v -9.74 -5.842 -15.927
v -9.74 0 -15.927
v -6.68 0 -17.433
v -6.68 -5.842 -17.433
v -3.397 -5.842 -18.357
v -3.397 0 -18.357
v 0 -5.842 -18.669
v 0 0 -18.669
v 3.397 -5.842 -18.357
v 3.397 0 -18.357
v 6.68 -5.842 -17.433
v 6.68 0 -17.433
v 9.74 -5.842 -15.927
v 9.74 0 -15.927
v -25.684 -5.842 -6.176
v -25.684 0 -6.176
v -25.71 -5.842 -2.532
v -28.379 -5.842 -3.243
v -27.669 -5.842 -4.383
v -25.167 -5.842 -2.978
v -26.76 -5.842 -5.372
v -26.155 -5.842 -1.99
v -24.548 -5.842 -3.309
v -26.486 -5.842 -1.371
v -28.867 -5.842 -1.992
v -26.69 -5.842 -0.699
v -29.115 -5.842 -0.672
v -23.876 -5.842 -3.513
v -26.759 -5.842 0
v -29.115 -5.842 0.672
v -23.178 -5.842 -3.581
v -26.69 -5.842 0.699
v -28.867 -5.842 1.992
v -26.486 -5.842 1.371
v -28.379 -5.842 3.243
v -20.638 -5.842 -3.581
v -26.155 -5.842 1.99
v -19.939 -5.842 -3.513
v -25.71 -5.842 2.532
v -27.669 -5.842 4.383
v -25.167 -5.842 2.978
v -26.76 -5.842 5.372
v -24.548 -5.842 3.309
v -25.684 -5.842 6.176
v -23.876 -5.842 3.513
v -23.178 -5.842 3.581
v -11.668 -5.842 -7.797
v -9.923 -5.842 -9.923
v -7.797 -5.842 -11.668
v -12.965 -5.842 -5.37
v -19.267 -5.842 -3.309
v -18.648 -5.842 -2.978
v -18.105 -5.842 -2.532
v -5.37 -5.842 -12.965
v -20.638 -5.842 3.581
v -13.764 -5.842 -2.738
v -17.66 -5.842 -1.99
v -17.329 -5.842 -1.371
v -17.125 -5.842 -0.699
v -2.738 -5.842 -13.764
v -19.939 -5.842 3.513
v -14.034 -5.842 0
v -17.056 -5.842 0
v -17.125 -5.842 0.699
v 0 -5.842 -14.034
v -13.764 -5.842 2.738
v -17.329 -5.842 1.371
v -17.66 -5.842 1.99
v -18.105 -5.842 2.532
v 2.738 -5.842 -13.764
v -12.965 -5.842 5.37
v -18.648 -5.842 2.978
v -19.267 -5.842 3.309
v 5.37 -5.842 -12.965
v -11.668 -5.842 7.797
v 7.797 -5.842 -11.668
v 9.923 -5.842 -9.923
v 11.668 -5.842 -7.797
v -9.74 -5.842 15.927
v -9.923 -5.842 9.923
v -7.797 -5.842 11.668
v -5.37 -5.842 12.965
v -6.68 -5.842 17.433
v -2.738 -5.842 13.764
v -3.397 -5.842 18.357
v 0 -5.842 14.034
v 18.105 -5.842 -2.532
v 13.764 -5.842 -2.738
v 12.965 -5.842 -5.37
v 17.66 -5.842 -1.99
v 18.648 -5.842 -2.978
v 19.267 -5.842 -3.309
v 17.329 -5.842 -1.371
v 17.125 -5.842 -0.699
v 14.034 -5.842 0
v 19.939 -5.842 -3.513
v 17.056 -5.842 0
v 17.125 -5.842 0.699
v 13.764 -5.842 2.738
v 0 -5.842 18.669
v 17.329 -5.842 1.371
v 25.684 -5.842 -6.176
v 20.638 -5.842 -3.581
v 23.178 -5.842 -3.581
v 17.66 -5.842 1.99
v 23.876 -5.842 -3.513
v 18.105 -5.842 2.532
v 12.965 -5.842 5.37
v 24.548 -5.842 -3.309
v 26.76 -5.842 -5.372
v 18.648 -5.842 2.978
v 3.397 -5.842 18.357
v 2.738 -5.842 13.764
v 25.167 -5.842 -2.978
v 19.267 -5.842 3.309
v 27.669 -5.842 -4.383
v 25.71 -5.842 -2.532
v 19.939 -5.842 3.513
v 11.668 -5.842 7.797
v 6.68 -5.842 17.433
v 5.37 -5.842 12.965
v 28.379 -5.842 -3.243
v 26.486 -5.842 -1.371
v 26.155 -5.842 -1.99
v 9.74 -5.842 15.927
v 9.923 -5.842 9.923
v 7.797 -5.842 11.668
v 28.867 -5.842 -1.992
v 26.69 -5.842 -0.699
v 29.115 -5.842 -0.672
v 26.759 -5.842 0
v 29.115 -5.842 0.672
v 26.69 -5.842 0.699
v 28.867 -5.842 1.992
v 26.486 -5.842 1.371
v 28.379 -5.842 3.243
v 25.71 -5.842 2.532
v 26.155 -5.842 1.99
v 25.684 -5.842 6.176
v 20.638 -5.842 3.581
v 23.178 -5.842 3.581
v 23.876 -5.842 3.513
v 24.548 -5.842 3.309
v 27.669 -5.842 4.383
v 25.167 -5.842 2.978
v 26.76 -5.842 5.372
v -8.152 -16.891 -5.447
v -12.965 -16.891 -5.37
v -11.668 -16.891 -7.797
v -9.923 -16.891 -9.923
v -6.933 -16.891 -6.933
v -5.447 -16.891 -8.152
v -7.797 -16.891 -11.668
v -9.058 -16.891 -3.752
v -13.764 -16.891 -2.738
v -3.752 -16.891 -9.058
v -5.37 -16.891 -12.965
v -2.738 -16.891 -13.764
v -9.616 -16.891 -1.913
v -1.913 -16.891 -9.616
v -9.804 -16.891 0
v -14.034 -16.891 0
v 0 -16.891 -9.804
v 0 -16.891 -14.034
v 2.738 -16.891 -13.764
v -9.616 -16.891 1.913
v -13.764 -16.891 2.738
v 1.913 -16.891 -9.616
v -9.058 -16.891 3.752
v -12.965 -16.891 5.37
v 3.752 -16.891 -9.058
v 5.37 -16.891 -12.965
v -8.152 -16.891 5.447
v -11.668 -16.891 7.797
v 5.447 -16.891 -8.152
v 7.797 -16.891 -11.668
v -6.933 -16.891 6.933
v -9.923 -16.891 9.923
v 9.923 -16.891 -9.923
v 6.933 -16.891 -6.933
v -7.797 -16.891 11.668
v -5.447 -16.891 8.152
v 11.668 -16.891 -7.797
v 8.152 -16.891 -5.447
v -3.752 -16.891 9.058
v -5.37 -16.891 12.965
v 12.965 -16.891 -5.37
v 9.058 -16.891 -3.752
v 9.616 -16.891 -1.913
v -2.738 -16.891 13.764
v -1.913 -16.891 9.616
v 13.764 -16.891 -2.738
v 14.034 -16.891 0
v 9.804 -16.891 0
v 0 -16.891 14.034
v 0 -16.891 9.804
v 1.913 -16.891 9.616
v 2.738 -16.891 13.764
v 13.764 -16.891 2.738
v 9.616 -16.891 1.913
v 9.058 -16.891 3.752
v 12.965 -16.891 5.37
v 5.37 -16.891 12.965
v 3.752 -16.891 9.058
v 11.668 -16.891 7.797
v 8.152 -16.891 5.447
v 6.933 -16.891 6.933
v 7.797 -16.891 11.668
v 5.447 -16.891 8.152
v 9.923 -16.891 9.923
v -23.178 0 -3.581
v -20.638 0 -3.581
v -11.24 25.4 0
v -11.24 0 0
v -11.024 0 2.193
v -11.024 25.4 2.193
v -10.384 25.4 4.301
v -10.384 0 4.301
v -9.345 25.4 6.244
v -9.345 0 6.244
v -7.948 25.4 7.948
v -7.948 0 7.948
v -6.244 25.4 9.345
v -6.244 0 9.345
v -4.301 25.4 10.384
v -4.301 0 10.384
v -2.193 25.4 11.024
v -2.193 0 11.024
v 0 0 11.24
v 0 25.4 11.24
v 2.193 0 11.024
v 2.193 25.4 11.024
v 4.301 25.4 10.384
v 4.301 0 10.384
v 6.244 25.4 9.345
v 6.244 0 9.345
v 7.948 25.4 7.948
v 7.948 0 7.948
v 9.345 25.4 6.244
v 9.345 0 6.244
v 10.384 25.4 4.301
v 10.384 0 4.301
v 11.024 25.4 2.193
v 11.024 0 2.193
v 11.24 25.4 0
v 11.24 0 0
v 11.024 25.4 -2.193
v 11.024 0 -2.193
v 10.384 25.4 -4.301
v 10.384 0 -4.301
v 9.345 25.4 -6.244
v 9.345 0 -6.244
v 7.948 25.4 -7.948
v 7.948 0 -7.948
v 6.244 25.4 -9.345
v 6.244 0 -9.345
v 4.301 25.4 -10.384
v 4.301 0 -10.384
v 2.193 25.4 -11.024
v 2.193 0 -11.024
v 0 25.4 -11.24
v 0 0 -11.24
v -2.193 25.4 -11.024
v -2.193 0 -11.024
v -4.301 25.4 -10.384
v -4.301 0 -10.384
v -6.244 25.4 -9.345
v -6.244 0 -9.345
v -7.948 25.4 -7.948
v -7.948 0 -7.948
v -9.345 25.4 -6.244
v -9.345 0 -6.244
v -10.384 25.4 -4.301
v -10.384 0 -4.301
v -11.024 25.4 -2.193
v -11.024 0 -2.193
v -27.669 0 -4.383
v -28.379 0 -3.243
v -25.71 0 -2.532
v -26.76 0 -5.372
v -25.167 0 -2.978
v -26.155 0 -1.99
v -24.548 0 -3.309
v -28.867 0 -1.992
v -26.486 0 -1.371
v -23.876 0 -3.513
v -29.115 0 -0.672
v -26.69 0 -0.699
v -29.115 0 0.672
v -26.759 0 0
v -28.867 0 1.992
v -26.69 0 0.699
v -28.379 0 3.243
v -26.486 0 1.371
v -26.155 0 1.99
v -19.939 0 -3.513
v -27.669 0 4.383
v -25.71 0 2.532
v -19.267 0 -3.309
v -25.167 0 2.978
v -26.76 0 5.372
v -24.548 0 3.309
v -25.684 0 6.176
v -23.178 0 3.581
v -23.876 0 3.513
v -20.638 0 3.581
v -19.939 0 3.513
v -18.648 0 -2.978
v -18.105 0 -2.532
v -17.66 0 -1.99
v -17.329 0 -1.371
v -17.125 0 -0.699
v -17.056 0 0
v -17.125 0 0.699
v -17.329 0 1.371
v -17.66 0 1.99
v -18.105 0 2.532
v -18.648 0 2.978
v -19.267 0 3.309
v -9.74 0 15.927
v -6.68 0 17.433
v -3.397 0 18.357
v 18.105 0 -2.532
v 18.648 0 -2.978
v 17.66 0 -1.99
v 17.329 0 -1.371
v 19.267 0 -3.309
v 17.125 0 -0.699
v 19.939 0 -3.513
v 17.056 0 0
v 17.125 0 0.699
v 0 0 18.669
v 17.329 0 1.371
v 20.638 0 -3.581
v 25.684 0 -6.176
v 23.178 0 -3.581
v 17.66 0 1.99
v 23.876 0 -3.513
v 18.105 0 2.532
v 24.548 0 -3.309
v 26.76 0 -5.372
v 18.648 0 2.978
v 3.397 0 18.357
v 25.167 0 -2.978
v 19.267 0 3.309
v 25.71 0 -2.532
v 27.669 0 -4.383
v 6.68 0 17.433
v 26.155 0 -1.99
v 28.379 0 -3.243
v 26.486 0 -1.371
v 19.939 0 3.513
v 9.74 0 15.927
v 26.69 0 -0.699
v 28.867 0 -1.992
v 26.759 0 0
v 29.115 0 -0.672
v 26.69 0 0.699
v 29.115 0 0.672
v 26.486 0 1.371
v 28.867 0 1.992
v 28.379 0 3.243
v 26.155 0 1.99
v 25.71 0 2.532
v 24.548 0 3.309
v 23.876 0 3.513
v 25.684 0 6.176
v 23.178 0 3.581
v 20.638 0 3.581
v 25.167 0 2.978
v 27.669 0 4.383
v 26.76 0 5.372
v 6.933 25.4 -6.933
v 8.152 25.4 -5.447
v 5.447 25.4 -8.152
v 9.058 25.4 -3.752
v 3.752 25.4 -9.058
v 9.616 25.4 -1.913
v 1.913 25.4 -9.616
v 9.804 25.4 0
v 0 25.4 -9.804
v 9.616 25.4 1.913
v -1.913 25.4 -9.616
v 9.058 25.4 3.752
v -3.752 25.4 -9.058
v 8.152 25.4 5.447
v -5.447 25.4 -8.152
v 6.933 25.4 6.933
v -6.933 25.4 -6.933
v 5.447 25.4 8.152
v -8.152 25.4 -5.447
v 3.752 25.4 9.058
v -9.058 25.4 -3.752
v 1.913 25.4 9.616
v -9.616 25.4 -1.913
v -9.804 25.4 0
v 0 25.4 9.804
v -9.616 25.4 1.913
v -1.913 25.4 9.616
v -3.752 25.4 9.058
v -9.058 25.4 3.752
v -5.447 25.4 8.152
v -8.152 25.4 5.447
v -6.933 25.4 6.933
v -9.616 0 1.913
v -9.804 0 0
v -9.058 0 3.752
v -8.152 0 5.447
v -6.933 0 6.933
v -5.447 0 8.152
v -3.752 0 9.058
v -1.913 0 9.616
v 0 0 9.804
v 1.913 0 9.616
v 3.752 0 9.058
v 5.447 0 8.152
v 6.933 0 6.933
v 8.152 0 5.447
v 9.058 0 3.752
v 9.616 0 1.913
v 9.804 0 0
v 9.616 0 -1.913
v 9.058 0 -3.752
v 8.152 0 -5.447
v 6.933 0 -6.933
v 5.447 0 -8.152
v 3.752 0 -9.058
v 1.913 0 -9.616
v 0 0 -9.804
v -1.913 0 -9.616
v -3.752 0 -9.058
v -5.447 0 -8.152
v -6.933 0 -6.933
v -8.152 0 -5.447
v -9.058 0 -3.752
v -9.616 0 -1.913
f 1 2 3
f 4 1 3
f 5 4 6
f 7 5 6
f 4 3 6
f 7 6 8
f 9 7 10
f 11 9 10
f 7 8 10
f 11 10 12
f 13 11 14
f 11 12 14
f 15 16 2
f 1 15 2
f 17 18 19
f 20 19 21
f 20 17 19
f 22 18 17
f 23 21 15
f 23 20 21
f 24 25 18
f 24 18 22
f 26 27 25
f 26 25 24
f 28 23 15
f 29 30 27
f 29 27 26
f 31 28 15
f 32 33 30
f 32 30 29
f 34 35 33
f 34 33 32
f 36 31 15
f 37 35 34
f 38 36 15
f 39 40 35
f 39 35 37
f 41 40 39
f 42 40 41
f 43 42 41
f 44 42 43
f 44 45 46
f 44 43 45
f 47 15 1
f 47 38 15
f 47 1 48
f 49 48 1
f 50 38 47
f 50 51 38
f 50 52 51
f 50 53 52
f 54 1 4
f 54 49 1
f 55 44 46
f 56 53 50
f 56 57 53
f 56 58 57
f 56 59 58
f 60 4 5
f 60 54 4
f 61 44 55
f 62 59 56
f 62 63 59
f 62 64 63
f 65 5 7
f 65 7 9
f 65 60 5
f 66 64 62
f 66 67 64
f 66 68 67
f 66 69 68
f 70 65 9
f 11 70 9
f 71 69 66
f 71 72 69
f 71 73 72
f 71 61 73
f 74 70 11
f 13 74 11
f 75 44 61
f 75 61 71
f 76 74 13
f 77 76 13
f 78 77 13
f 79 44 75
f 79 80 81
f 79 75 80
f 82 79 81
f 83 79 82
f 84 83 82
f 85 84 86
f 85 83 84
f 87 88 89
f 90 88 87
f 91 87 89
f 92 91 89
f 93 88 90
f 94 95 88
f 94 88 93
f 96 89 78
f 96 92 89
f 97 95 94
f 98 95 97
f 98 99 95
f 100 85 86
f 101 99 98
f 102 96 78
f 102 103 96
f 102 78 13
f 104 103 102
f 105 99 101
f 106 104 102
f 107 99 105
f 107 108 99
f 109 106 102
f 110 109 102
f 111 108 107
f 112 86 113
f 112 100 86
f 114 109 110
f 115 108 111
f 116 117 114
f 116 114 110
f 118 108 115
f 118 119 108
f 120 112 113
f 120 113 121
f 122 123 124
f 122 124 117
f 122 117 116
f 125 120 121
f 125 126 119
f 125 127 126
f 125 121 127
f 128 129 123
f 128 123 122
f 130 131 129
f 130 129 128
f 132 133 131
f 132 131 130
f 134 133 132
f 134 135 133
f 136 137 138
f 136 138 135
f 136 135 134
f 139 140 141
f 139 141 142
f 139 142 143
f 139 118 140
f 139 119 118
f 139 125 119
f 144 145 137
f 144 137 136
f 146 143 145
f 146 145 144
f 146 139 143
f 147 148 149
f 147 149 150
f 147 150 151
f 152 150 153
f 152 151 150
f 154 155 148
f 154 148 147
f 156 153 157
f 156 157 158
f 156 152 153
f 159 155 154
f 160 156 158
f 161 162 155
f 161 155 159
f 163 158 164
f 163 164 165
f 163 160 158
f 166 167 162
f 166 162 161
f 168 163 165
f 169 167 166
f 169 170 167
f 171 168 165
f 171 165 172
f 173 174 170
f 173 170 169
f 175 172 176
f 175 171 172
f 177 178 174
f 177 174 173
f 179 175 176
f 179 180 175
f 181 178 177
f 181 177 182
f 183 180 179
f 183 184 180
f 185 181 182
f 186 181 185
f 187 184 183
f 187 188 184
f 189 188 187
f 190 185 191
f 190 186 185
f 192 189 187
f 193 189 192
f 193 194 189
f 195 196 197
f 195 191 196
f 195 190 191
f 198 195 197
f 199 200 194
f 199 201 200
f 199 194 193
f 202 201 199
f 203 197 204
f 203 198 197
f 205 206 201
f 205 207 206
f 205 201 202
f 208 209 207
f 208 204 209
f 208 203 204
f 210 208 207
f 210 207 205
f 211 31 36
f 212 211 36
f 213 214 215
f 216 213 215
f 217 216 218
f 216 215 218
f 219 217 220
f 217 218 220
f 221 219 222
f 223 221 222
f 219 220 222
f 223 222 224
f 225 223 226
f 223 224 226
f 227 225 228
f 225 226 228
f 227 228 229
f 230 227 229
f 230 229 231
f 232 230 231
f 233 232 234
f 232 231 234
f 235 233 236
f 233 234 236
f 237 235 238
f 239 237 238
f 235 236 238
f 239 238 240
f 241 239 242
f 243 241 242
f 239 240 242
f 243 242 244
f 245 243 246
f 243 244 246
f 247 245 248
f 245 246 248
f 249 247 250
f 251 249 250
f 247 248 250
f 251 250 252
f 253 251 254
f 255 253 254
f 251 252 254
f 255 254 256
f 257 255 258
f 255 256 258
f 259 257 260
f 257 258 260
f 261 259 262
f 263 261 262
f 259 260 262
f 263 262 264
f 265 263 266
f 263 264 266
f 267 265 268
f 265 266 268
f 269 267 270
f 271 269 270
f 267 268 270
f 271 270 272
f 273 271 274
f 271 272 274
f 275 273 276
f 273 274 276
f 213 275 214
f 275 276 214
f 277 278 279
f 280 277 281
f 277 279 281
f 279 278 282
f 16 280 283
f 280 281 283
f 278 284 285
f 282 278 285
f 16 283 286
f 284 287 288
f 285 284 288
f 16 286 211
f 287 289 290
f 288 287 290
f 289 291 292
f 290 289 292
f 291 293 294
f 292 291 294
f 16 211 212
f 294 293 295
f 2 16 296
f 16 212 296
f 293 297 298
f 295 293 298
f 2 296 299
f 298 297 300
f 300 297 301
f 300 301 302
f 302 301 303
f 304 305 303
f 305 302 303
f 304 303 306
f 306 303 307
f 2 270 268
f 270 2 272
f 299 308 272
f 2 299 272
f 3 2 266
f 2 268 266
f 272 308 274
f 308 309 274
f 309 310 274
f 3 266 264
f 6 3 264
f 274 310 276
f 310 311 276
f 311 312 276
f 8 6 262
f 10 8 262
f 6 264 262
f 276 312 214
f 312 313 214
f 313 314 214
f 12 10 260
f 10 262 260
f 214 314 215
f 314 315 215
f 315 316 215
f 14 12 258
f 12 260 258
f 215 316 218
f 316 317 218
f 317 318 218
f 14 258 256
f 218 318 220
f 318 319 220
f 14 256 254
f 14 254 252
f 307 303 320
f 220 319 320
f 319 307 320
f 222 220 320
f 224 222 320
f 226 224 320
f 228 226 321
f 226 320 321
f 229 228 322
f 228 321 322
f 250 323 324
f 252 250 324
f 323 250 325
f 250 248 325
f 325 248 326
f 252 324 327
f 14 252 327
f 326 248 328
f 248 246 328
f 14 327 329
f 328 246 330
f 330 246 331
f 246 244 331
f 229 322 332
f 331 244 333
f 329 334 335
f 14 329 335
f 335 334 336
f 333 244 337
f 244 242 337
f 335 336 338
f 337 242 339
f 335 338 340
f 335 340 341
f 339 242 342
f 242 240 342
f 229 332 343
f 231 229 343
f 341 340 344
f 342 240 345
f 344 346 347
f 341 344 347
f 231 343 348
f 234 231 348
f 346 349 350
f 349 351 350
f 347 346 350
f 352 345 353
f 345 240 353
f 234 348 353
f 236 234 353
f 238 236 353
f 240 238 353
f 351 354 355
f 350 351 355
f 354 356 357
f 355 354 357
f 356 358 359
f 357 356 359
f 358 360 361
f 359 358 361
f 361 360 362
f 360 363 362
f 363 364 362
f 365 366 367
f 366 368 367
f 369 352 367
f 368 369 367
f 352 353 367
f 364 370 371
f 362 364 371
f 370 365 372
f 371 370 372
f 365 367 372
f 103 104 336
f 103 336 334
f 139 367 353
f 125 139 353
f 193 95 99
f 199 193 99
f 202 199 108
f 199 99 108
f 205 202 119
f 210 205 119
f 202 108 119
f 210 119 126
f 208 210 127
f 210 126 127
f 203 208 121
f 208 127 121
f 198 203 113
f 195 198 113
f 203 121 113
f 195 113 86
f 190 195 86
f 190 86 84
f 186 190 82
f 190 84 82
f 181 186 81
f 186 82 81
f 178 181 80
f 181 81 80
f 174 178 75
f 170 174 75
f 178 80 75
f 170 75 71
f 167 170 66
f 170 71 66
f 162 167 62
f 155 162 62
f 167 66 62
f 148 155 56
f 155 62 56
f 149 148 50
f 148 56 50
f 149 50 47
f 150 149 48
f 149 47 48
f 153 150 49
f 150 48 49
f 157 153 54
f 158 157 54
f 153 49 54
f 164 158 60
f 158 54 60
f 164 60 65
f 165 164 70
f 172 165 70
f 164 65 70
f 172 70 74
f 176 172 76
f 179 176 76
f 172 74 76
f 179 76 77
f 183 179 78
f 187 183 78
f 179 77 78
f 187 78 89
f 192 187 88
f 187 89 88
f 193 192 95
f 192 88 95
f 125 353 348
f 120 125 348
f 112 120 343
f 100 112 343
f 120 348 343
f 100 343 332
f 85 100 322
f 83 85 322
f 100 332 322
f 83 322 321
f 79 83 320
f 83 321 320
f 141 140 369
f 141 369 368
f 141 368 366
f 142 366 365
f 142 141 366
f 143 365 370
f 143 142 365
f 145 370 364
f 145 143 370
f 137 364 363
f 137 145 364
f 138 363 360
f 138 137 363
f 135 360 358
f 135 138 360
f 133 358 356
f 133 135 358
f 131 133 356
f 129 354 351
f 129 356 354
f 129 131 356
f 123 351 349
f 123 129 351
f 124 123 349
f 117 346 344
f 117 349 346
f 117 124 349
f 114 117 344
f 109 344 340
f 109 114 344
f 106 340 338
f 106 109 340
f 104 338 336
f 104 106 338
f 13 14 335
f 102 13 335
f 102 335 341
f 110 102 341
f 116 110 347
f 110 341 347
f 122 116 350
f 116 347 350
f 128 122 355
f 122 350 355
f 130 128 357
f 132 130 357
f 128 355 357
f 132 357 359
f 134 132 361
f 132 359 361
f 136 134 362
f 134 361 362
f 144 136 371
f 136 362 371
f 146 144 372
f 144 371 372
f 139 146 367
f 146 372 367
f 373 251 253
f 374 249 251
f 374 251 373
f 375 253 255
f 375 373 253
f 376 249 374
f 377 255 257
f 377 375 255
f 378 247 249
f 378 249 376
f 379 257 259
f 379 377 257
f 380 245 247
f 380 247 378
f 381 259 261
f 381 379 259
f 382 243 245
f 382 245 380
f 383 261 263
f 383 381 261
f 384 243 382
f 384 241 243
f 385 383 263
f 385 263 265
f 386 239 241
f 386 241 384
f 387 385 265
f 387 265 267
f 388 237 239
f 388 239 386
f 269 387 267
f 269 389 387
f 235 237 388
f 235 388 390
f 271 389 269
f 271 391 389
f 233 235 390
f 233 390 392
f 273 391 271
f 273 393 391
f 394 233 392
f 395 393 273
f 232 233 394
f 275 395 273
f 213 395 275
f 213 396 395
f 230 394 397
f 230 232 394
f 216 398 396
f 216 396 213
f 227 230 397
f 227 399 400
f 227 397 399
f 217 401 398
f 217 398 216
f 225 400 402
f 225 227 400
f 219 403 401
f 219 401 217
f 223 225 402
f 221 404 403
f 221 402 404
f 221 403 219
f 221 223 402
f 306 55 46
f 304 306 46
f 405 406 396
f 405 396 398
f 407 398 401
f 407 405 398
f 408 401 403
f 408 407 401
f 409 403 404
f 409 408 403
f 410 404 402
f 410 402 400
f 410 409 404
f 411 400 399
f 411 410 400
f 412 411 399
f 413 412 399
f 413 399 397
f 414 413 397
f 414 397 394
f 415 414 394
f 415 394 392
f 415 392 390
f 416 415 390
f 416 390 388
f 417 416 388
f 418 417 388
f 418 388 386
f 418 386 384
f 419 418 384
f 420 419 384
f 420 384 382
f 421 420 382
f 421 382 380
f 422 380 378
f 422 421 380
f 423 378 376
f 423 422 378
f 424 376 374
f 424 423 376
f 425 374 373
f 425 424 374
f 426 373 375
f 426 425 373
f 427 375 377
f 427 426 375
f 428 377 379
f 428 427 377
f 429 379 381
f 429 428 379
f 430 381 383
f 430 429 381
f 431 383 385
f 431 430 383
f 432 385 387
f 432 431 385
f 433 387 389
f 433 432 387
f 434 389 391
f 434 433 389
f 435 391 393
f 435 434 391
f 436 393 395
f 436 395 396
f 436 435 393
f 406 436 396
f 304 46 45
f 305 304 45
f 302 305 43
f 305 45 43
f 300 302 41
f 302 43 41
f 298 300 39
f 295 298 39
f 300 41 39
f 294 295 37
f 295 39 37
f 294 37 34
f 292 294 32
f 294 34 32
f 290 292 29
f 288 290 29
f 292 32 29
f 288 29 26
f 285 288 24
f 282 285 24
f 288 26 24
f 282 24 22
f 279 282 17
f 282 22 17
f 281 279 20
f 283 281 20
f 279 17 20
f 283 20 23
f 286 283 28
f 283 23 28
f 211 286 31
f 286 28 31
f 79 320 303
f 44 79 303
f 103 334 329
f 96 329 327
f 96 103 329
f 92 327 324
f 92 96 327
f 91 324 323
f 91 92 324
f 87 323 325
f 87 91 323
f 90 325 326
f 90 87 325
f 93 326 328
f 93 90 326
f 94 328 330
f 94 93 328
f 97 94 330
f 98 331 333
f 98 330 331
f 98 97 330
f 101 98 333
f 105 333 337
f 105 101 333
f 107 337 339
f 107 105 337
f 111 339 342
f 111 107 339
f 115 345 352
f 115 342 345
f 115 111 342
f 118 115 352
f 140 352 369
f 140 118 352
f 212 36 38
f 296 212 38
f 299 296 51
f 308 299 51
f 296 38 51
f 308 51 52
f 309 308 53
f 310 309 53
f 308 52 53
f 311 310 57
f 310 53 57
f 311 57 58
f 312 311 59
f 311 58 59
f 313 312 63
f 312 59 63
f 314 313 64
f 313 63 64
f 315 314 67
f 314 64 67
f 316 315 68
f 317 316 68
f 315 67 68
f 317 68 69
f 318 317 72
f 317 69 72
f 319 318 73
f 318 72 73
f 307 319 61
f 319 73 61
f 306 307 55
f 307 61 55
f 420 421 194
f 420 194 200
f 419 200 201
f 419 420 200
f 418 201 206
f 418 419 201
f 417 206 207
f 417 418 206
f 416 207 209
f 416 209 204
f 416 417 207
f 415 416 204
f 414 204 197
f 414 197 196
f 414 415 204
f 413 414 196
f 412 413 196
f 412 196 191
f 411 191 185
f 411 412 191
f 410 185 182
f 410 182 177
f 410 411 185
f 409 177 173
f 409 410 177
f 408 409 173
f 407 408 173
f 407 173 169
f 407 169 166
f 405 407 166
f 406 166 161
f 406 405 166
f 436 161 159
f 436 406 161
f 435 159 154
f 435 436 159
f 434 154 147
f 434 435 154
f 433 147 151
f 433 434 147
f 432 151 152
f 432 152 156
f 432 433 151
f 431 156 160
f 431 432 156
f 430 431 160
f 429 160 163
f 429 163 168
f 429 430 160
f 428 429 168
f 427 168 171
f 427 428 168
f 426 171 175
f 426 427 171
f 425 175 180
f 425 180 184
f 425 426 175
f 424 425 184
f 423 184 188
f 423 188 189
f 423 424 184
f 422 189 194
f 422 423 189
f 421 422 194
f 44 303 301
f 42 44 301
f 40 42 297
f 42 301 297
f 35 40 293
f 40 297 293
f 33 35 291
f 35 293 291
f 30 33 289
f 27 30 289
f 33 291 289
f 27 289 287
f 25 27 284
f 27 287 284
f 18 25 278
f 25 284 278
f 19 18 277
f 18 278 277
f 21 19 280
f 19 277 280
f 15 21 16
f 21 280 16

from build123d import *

# Parameters (mm, degrees)
F0_R     = 9.8044
F1_DEPTH = 5.842
F3_DEPTH = 5.843
F4_R     = 14.0335
F4_R_2   = 9.8044
F5_DEPTH = 11.049
F6_R     = 11.2395
F6_R_2   = 9.8044
F7_DEPTH = 25.4


# Not quite as in the source:
# - a pattern or mirror of a feature is missing from the dataset's text; its kind, count and spacing are read off the source's solid


with BuildPart() as f1:
    # F0 (on Front) → F1 (new body)
    with BuildSketch(Plane.XZ):
        with BuildLine():
            Line((25.6843695652, 6.1756276837), (9.7403478261, 15.9266187632))
            ThreePointArc((9.7403478261, 15.9266187632), (0, 18.669), (-9.7403478261, 15.9266187632))
            Line((-9.7403478261, 15.9266187632), (-25.6843695652, 6.1756276837))
            ThreePointArc((-25.6843695652, 6.1756276837), (-29.1465, 0), (-25.6843695652, -6.1756276837))
            Line((-25.6843695652, -6.1756276837), (-9.7403478261, -15.9266187632))
            ThreePointArc((-9.7403478261, -15.9266187632), (0, -18.669), (9.7403478261, -15.9266187632))
            Line((9.7403478261, -15.9266187632), (25.6843695652, -6.1756276837))
            ThreePointArc((25.6843695652, -6.1756276837), (29.1465, 0), (25.6843695652, 6.1756276837))
        make_face()
        Circle(F0_R, mode=Mode.SUBTRACT)
    extrude(amount=F1_DEPTH)

    # F2 (on face) → F3 (cut, through all)
    with BuildSketch(Plane.XZ.offset(5.842)):
        with BuildLine():
            ThreePointArc((-23.1775, 3.5814), (-26.7589, 0), (-23.1775, -3.5814))
            Line((-23.1775, -3.5814), (-20.6375, -3.5814))
            ThreePointArc((-20.6375, -3.5814), (-17.0561, 0), (-20.6375, 3.5814))
            Line((-20.6375, 3.5814), (-23.1775, 3.5814))
        make_face()
    f3 = extrude(amount=-F3_DEPTH, mode=Mode.SUBTRACT)

    # F3_copies: F3 across plane
    add(f3.mirror(Plane(origin=(0, 0, 0), x_dir=(0, 0, 1), z_dir=(1, 0, 0))), mode=Mode.SUBTRACT)

    # F4 (on face) → F5 (join)
    with BuildSketch(Plane.XZ.offset(5.842)):
        Circle(F4_R)
        Circle(F4_R_2, mode=Mode.SUBTRACT)
    extrude(amount=F5_DEPTH)

    # F6 (on face) → F7 (join)
    with BuildSketch(Plane(origin=(0, 0, 0), x_dir=(-1, 0, 0), z_dir=(0, 1, 0))):
        Circle(F6_R)
        Circle(F6_R_2, mode=Mode.SUBTRACT)
    extrude(amount=F7_DEPTH)


solid = f1.part
